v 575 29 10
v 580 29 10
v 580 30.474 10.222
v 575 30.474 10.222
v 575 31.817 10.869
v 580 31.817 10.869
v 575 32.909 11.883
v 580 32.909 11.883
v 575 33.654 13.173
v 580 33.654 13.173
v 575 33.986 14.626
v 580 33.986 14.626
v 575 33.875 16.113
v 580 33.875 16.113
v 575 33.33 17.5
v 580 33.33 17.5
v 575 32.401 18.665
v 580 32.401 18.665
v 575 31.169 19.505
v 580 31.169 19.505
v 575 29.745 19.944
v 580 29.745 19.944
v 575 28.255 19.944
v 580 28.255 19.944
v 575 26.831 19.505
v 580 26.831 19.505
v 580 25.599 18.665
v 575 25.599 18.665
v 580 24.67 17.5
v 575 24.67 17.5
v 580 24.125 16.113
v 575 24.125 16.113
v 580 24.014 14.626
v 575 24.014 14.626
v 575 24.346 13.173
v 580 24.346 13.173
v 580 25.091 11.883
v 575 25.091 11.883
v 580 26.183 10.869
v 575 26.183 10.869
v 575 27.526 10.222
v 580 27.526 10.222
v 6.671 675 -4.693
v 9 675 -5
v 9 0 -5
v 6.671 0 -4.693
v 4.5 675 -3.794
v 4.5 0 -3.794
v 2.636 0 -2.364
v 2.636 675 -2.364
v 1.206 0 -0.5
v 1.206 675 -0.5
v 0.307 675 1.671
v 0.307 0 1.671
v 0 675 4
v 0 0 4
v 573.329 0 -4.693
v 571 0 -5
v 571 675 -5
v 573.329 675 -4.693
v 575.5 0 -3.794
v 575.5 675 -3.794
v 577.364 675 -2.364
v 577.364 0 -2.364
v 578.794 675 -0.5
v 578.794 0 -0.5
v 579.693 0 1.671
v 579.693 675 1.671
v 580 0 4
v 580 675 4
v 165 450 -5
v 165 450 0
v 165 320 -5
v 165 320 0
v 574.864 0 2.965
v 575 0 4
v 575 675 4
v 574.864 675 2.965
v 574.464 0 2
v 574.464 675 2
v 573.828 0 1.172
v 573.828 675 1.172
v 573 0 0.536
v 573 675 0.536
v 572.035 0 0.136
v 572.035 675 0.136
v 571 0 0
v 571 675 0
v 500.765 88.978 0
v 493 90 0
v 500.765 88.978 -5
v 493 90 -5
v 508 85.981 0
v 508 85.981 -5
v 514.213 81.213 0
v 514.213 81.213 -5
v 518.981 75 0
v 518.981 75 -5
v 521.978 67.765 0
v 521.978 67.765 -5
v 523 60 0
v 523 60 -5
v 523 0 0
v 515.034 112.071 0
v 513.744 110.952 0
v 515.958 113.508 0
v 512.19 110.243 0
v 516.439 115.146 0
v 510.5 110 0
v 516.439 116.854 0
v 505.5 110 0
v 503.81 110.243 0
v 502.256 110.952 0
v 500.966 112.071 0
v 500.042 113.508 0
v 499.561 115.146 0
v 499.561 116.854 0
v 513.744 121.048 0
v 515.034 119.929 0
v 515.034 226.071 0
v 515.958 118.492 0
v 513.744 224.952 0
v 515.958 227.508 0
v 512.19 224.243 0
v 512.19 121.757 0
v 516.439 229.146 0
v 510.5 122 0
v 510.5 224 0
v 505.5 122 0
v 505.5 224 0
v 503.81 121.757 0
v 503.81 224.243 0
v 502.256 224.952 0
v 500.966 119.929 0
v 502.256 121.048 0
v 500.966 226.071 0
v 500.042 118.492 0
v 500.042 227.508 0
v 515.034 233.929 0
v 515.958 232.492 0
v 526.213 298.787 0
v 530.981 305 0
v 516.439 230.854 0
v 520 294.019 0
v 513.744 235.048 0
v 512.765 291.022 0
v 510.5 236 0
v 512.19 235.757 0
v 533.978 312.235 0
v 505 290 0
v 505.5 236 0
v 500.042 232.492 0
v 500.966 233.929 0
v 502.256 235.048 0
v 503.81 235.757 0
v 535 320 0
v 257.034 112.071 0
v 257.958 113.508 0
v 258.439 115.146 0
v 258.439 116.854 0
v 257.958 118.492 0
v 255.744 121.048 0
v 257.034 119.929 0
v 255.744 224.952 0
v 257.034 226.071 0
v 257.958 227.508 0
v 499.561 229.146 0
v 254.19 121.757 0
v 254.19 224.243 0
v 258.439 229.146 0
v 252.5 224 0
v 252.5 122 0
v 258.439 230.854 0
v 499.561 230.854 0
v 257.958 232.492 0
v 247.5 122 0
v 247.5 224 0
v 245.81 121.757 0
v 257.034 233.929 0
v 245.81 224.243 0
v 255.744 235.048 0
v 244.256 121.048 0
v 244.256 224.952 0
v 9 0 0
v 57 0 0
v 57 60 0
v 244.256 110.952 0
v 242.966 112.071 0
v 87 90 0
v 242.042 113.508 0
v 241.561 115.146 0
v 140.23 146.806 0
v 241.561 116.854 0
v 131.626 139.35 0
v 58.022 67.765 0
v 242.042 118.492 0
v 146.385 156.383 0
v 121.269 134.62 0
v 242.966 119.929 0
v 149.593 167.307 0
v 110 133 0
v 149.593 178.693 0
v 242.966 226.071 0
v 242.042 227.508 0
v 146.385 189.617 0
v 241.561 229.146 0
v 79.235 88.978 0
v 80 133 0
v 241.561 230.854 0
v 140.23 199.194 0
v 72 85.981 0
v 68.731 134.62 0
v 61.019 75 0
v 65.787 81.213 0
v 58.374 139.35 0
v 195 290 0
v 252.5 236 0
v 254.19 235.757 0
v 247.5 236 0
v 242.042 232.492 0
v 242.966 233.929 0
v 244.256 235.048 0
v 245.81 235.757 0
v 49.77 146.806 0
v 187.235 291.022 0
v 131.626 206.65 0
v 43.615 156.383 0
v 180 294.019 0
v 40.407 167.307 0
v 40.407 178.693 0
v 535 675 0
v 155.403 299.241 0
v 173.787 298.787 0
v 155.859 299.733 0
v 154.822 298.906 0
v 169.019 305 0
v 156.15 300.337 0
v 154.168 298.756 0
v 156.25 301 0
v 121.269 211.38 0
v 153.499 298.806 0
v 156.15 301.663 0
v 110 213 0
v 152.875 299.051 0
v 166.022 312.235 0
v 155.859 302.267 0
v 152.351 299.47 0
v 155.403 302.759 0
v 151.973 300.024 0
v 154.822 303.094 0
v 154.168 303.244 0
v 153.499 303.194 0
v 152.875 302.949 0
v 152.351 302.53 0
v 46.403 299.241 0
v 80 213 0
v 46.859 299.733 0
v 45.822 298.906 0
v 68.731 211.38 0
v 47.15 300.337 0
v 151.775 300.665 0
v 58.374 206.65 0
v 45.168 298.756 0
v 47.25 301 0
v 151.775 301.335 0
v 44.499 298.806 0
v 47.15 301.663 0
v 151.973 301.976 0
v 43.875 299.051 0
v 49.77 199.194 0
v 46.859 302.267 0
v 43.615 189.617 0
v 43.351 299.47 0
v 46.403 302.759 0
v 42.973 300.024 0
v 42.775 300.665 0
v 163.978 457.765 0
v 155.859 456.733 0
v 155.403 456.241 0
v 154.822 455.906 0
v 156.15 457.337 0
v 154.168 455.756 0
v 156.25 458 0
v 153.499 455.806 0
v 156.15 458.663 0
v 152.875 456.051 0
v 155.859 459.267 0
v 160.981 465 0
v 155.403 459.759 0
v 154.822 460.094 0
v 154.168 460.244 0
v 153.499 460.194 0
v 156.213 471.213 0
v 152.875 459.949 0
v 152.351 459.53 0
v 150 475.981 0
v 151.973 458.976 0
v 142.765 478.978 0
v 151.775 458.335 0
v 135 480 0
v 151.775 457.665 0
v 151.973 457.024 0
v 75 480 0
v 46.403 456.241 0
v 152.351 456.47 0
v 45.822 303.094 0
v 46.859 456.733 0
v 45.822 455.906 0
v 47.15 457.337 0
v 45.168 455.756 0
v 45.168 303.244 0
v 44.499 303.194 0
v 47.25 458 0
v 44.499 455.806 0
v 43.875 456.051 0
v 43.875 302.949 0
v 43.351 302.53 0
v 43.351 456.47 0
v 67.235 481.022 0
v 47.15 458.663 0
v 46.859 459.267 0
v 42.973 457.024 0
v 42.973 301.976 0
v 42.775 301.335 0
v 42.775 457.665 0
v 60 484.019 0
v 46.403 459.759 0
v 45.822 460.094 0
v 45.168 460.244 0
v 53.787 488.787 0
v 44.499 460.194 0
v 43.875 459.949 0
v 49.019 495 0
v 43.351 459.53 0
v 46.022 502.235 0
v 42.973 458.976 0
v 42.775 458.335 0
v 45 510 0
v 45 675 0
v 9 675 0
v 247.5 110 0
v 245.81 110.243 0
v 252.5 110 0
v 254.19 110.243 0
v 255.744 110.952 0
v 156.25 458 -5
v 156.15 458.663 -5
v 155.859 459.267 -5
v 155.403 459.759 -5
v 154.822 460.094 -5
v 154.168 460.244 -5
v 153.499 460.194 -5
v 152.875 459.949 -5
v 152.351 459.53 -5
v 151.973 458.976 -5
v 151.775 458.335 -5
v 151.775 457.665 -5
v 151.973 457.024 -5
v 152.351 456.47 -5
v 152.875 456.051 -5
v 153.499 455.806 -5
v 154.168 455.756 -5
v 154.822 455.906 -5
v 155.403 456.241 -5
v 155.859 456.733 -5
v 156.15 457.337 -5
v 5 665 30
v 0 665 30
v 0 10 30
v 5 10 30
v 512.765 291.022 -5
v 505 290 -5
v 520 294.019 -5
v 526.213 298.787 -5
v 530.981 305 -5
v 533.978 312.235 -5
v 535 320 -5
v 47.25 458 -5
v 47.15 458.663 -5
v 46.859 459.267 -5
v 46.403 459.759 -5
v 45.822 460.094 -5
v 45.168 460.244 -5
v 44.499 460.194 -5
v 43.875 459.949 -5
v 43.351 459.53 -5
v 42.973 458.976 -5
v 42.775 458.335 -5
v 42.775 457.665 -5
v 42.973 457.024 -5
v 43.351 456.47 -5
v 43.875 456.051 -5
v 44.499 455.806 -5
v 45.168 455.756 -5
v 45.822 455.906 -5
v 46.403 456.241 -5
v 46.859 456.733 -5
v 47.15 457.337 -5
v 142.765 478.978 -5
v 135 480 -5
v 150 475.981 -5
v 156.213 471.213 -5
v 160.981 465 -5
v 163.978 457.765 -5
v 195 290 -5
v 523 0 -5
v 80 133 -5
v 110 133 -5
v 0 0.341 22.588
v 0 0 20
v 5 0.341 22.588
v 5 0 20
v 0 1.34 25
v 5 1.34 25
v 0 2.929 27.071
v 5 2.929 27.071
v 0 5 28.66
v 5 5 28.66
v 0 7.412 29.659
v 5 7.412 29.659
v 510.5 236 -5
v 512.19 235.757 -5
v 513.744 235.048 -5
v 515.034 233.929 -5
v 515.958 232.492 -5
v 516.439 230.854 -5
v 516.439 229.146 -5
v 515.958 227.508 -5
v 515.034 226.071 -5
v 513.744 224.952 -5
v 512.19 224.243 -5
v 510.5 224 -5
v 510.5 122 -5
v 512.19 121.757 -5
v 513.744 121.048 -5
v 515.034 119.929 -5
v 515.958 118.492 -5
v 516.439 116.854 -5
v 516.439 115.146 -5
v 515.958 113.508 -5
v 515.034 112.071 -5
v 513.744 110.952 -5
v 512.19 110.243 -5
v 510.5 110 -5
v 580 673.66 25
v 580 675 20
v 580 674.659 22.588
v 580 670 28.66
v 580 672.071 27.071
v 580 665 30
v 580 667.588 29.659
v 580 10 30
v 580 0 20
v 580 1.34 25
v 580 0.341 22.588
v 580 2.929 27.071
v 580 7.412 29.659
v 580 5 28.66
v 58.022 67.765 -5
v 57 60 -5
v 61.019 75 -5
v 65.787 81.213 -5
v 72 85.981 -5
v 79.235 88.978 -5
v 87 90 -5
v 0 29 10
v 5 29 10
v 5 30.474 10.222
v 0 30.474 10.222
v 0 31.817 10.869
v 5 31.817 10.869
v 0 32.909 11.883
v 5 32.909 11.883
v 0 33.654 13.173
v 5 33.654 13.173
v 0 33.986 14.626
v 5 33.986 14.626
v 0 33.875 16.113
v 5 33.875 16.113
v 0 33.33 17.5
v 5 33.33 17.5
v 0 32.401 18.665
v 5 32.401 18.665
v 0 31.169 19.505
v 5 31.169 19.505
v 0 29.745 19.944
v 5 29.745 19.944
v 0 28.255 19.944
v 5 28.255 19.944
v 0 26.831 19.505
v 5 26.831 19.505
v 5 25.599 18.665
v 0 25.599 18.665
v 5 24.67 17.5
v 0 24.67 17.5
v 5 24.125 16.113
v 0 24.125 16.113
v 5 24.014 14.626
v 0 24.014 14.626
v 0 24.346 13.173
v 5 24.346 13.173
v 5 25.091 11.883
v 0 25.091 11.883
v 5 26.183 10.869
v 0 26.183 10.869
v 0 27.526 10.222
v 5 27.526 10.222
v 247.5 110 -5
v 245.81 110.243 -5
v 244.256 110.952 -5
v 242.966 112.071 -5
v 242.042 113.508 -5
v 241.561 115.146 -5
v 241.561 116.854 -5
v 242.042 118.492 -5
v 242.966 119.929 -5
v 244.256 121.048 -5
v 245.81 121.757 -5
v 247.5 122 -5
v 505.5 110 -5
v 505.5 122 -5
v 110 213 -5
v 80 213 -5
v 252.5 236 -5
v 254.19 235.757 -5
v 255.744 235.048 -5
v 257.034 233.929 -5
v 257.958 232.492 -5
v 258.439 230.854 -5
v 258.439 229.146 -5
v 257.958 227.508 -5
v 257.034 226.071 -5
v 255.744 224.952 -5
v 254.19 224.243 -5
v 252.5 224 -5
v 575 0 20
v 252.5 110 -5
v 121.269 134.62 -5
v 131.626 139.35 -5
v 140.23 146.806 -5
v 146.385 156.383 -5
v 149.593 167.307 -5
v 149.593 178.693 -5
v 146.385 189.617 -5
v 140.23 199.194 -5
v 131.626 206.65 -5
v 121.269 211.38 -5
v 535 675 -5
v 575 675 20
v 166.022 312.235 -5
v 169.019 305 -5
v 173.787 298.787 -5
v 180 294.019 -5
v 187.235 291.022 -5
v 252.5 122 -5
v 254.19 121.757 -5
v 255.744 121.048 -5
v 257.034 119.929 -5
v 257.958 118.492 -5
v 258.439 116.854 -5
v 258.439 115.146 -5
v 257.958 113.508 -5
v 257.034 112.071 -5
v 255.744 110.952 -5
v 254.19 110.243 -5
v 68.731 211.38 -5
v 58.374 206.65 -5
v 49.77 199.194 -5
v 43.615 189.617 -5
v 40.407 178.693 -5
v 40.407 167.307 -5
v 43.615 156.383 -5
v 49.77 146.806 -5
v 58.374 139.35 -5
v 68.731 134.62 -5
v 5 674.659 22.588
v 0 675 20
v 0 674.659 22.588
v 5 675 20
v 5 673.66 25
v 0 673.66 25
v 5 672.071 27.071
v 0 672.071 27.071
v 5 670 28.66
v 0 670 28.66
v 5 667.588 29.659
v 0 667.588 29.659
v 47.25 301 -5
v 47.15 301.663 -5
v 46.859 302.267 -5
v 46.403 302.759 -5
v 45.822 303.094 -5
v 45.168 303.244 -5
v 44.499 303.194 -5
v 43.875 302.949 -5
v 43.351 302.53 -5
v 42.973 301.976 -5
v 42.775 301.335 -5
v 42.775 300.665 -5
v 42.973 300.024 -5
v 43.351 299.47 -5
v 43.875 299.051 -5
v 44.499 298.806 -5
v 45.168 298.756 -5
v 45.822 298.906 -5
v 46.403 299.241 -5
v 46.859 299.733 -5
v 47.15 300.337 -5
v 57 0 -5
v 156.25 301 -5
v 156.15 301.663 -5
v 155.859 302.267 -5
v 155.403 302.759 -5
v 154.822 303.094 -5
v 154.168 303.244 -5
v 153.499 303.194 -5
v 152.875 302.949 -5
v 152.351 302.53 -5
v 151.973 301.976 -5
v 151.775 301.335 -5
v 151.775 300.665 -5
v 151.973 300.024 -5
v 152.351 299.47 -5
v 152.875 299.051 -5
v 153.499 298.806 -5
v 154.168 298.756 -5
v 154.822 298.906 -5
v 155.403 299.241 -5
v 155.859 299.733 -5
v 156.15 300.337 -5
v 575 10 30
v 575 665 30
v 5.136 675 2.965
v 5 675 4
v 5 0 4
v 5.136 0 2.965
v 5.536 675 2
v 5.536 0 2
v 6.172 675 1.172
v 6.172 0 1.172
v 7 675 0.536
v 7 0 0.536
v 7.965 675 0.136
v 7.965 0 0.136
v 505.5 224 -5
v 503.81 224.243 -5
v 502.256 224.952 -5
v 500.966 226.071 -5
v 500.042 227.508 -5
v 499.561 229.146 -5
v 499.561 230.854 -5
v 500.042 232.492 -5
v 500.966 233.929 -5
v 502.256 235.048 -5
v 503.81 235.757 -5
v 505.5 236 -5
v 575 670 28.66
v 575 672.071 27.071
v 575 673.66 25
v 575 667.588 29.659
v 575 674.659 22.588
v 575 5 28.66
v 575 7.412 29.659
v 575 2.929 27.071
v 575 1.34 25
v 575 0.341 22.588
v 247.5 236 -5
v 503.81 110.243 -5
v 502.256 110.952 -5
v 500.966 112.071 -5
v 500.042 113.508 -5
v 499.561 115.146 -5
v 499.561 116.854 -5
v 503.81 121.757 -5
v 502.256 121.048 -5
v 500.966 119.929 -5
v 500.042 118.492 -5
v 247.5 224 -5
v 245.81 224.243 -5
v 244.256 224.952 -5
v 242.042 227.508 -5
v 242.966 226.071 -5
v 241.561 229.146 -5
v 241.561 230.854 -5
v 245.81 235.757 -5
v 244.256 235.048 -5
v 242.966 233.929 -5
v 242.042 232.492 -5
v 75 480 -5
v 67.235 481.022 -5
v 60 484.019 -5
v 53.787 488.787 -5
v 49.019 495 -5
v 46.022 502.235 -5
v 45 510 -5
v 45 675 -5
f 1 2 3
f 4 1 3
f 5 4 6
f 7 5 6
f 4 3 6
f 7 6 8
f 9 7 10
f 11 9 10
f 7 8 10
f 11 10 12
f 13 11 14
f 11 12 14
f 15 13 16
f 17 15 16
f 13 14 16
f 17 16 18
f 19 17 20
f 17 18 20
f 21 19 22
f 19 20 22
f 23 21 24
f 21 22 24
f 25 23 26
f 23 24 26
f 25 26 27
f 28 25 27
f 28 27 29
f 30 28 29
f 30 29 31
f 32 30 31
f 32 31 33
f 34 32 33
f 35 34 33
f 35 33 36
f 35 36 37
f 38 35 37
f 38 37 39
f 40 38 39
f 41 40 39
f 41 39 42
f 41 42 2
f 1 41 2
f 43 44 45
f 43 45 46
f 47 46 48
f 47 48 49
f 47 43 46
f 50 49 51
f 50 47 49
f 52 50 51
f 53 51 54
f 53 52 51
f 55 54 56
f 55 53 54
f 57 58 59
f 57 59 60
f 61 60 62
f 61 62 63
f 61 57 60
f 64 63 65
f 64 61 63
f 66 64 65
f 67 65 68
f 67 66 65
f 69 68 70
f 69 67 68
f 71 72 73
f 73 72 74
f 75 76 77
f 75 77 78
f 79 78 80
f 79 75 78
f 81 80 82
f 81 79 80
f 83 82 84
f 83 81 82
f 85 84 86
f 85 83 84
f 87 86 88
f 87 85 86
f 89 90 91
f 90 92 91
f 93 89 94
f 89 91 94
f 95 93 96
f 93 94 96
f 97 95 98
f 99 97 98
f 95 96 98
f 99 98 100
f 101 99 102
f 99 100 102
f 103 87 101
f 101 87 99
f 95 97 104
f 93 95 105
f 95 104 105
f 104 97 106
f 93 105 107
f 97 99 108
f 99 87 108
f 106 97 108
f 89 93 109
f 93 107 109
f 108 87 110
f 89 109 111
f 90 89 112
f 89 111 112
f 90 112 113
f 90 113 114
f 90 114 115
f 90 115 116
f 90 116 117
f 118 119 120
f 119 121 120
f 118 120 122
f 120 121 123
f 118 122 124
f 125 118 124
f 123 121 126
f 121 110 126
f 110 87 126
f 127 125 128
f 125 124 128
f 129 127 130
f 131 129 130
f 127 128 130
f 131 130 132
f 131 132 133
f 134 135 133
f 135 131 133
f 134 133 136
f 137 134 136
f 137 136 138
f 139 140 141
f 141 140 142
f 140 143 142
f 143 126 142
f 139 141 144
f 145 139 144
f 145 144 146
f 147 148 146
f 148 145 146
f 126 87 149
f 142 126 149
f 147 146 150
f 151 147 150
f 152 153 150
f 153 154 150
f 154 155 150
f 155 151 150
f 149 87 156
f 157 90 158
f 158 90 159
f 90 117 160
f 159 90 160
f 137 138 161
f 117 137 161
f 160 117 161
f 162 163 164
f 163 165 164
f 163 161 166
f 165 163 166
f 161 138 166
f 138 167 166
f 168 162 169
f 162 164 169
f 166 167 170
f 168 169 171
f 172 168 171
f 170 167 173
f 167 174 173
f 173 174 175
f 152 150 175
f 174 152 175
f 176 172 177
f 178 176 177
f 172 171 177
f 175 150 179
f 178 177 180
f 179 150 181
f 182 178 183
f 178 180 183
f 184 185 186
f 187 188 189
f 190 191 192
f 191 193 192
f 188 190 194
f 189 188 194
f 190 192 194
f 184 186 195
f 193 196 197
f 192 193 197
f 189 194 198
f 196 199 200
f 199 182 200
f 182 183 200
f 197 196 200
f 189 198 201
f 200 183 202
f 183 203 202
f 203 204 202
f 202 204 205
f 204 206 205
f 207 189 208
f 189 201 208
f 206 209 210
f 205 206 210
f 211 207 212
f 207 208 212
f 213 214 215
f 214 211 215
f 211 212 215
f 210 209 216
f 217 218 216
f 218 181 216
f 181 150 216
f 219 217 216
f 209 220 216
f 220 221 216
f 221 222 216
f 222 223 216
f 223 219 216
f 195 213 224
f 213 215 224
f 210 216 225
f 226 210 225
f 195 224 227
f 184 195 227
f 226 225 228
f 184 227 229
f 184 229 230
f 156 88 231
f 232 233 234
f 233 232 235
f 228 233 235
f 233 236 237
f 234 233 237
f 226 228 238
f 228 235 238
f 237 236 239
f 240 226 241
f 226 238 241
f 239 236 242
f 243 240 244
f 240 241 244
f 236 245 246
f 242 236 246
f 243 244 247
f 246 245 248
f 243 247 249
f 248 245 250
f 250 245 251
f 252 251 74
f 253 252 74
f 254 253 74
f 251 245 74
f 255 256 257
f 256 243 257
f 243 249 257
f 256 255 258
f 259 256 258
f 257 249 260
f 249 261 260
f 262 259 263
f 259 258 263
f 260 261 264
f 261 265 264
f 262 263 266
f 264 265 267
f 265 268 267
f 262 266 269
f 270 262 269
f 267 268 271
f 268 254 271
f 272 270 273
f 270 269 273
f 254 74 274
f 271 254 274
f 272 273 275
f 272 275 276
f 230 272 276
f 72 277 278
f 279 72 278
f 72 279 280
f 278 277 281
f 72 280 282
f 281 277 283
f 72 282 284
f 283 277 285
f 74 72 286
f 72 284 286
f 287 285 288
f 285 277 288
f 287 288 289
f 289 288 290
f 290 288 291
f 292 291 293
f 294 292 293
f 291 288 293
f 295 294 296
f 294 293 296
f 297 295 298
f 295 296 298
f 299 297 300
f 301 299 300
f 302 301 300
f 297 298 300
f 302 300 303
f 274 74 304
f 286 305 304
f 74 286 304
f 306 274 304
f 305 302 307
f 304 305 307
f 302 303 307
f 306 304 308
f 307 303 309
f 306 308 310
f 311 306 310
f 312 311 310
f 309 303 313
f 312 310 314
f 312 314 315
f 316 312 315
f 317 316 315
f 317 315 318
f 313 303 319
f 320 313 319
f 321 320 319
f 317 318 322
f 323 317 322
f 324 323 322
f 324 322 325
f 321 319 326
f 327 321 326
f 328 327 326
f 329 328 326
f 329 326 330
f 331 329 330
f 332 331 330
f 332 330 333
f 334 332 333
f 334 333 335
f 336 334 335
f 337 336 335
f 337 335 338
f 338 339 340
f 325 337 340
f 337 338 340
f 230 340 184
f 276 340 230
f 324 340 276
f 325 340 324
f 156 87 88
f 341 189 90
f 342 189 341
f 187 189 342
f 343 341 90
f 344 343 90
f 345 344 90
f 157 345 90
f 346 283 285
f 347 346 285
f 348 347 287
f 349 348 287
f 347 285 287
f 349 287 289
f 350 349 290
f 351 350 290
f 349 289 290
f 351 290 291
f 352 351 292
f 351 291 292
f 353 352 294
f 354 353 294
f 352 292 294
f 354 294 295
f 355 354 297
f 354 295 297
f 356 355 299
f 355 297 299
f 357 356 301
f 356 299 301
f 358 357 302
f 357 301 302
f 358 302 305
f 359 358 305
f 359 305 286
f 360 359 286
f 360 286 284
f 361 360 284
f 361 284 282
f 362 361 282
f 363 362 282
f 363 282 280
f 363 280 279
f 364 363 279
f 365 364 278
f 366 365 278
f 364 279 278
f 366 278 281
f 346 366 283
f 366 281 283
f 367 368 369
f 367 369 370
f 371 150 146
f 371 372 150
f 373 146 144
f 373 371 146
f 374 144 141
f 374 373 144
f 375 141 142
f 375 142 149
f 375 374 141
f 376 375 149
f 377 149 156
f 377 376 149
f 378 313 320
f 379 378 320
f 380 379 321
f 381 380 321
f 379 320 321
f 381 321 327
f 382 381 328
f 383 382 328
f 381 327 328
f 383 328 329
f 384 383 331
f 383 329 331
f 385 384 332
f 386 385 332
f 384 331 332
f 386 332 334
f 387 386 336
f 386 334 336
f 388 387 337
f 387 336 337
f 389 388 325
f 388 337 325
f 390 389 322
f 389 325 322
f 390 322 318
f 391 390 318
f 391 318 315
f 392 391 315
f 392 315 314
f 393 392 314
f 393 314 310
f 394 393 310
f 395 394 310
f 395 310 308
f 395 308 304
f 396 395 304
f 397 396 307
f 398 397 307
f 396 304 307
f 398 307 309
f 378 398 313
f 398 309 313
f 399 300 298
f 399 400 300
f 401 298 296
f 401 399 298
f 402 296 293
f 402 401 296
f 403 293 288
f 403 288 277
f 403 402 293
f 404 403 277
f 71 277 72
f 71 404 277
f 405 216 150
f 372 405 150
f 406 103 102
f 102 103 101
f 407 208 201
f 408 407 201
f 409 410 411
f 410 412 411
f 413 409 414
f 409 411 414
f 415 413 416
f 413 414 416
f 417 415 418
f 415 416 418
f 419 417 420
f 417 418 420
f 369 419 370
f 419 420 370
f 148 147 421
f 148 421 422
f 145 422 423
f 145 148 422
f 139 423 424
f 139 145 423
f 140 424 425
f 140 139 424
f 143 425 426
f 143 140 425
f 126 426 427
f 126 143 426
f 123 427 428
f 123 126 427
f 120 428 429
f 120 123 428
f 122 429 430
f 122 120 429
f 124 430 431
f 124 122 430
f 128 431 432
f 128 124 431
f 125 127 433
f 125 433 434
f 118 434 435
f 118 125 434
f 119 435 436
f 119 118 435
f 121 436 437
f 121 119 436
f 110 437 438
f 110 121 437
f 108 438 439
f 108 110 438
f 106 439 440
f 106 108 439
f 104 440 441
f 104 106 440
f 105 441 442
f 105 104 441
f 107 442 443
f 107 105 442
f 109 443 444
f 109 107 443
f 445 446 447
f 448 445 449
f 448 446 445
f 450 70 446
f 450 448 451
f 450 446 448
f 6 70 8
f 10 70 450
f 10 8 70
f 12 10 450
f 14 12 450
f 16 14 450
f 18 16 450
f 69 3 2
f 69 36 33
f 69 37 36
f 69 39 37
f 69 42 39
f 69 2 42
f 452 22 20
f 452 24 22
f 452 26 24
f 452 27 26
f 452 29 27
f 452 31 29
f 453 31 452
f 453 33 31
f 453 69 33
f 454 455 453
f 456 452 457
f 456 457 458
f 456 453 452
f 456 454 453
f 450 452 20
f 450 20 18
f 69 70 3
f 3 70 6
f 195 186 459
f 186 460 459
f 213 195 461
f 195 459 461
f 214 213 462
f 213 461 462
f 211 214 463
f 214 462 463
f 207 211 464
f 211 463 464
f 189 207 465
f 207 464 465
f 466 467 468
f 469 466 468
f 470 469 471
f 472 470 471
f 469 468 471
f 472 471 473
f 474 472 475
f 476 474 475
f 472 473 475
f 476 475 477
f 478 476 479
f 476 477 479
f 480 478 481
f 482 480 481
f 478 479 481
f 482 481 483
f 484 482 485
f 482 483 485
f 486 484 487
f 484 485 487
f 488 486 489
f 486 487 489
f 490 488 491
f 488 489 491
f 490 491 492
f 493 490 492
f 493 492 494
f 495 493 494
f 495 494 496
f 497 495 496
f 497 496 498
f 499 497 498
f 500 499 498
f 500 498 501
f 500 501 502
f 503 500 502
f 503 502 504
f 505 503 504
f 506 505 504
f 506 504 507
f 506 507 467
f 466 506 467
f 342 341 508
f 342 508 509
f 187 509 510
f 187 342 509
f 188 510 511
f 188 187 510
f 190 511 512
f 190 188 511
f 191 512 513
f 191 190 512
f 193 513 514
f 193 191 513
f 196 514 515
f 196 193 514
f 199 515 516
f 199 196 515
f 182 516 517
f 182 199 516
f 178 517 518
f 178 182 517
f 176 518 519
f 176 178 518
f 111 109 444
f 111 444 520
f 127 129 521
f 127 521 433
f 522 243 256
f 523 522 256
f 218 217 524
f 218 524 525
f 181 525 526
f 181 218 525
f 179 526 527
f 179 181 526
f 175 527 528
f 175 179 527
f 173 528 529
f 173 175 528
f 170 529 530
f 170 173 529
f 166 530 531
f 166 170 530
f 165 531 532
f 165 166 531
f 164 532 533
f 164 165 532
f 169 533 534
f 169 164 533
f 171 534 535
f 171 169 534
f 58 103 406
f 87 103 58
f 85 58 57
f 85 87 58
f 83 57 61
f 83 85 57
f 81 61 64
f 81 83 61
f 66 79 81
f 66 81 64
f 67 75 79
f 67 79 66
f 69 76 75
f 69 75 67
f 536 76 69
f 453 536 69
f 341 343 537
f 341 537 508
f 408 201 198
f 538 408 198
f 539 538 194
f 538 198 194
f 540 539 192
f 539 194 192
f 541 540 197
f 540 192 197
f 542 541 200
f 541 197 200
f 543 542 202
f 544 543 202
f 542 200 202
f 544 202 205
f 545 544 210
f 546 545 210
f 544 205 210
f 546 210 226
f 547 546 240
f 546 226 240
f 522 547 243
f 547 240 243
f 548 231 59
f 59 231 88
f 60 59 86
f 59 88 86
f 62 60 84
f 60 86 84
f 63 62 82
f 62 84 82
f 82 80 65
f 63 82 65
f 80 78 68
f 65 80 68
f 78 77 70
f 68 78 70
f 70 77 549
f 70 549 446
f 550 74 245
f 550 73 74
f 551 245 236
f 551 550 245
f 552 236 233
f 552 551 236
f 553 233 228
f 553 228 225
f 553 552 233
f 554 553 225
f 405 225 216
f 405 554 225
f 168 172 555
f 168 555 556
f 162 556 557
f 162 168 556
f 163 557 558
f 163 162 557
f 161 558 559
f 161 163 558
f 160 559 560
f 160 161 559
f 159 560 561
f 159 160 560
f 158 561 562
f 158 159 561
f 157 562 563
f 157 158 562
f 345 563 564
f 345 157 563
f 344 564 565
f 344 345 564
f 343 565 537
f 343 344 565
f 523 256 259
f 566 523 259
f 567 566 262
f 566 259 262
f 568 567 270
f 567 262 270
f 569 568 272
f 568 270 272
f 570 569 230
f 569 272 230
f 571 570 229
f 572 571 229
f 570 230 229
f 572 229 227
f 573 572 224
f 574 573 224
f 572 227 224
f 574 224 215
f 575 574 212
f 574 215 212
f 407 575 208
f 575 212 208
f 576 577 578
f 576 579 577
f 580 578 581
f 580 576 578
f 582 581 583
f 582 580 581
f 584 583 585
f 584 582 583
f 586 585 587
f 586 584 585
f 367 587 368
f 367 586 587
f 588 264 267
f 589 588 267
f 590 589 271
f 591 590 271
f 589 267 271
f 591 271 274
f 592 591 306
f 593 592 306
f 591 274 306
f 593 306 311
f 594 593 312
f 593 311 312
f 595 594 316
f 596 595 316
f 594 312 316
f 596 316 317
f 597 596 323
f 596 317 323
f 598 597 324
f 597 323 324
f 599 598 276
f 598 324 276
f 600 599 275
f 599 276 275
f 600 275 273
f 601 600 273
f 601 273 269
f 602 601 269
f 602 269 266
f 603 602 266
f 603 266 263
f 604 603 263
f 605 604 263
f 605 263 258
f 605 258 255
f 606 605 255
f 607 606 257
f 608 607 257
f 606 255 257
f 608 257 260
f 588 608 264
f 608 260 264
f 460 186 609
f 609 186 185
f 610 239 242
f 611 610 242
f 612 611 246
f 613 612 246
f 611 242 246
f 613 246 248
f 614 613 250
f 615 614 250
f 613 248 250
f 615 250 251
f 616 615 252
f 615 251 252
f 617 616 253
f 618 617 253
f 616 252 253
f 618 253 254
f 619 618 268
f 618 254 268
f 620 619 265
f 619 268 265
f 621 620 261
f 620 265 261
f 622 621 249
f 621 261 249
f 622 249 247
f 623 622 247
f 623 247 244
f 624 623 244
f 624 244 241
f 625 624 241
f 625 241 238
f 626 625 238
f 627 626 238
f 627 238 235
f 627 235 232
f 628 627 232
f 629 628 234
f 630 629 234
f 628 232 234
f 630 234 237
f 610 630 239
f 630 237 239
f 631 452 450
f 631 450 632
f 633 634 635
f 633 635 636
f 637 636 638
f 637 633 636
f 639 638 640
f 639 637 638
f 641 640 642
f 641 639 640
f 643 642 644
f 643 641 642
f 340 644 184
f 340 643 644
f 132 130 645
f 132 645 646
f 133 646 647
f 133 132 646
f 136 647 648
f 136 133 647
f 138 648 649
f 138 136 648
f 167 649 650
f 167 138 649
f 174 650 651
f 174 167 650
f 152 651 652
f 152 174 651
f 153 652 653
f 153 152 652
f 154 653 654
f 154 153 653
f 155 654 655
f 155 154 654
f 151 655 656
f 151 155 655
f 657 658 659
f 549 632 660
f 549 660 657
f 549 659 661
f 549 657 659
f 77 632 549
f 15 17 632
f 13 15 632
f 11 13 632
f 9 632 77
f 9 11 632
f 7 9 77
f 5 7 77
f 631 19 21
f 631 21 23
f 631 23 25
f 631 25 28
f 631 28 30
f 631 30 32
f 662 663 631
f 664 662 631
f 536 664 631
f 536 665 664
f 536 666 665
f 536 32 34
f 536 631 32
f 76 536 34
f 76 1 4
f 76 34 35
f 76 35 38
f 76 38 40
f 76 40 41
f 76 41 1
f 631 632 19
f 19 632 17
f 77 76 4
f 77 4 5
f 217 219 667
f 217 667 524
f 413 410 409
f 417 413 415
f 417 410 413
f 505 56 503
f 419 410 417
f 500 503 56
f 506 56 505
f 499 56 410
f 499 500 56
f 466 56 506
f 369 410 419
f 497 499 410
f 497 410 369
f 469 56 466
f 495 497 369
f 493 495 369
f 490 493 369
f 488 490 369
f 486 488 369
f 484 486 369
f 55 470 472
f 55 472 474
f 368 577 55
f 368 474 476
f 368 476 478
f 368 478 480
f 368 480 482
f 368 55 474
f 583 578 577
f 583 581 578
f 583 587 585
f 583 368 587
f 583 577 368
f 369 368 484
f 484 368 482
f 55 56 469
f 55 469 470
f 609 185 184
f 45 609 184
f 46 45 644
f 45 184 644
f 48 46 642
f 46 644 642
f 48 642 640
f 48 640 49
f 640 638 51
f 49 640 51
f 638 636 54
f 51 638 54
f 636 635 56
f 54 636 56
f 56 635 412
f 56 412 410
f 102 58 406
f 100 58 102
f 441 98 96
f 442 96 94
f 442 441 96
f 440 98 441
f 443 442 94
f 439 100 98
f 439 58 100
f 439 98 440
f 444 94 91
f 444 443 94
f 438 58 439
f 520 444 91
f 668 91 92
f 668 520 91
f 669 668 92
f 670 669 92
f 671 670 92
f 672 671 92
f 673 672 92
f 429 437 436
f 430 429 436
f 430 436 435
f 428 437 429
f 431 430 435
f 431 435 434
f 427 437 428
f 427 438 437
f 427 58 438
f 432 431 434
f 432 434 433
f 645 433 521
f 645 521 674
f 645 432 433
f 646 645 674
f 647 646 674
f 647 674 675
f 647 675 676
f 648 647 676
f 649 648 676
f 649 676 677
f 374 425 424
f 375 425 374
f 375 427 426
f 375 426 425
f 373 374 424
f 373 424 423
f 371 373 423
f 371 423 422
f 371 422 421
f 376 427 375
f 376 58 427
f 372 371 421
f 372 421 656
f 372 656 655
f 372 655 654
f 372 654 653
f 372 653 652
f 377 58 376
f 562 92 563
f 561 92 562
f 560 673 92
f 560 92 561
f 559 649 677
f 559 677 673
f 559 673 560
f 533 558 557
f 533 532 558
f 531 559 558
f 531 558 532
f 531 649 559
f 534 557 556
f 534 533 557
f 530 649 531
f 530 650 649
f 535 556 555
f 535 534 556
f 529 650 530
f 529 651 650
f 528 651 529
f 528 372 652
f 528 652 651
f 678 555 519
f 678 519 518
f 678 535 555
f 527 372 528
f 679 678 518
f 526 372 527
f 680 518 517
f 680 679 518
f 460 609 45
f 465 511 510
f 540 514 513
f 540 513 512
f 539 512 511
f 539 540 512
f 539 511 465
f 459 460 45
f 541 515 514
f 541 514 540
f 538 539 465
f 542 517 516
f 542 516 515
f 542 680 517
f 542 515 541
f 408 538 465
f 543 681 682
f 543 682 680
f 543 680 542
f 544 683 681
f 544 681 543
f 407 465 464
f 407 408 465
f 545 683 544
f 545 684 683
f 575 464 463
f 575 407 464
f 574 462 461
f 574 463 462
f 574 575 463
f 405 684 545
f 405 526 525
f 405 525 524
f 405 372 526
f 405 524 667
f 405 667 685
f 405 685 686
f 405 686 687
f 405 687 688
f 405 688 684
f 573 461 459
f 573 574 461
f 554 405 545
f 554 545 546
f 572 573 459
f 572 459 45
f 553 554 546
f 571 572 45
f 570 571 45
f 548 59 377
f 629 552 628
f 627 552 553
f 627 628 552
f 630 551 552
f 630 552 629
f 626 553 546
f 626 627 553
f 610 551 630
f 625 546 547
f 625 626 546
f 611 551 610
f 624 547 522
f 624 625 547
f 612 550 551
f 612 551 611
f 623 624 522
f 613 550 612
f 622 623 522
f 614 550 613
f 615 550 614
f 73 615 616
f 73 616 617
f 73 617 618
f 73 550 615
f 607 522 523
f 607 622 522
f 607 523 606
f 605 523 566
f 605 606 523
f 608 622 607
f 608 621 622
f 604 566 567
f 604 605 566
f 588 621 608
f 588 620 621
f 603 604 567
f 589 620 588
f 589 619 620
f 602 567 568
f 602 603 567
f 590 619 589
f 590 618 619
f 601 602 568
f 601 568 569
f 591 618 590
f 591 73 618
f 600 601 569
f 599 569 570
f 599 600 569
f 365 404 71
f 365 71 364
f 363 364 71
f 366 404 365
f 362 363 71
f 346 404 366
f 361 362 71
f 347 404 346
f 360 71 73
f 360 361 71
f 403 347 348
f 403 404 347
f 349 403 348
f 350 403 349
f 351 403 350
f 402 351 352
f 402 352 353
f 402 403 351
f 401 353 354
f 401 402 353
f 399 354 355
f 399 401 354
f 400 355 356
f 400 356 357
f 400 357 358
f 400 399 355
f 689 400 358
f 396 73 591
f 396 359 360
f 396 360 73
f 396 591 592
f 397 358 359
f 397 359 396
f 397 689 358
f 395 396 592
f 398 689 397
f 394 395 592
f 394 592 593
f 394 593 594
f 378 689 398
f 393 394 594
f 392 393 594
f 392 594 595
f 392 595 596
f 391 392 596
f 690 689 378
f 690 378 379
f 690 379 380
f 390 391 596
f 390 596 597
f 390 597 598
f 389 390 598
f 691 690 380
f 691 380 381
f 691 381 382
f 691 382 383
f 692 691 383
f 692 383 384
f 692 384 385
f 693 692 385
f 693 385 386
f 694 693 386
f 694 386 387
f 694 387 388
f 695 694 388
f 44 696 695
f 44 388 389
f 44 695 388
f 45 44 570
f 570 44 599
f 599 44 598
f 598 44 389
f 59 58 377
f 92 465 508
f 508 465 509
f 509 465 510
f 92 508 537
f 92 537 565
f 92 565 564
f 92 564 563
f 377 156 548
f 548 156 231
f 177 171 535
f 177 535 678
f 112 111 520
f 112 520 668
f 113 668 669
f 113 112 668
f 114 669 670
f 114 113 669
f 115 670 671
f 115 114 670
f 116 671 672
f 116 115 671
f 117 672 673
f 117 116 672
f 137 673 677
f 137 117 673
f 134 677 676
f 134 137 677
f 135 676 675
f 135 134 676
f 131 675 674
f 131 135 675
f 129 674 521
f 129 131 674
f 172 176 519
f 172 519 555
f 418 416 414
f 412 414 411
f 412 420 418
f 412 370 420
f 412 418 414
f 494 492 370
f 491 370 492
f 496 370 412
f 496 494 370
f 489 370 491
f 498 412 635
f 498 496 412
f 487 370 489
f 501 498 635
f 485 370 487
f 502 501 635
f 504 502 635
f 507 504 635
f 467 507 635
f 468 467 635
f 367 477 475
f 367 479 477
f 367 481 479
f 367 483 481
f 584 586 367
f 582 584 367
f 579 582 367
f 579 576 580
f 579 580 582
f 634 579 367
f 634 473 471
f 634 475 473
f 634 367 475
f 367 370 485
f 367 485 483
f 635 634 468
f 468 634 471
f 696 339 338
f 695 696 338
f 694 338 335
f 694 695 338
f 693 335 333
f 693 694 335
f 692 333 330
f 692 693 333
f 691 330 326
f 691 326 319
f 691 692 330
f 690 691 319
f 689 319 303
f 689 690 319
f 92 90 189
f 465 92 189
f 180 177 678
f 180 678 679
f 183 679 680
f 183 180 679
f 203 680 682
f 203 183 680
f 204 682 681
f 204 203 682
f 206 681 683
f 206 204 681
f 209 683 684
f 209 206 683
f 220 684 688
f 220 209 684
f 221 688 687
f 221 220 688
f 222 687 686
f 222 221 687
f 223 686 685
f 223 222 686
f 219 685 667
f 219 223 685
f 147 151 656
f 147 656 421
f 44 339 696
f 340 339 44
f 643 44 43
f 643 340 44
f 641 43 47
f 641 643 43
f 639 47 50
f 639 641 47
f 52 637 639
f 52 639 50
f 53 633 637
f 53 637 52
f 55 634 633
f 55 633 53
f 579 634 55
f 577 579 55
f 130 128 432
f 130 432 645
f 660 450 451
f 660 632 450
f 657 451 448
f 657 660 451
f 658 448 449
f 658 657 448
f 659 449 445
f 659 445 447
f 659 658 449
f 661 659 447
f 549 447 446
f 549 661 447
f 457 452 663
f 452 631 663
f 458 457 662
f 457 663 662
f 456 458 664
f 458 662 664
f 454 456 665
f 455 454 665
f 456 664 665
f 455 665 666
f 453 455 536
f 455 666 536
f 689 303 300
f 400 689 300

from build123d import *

# Parameters (mm, degrees)
SKETCH_1_R                         = 2.25
SM_BASE_FLANGE_1_DEPTH             = 5
FILLET_1_R                         = 30
SM_EDGE_FLANGE_1_STRIP_W           = 28
SM_EDGE_FLANGE_1_STRIP_H           = 5
SM_EDGE_FLANGE_1_STRIP_CUT_DEPTH   = 675
SM_EDGE_FLANGE_1_STRIP_2_W         = 28
SM_EDGE_FLANGE_1_STRIP_2_H         = 5
SM_EDGE_FLANGE_1_STRIP_CUT_2_DEPTH = 675
SM_EDGE_FLANGE_1_DEPTH             = 675
SM_EDGE_FLANGE_1_BEND_DEPTH        = 675
CUT_EXTRUDE_3_REACH                = 892.463
FILLET_2_R                         = 10
SKETCH_12_R                        = 5
CUT_EXTRUDE_4_DEPTH                = 891.463362525


# Sheet-metal steps are written as plain solids
with BuildPart() as part:
    # Sketch 1 → 基体-法兰1 (new body)
    with BuildSketch(Plane.XY):
        Polygon((0, 0), (0, 675), (45, 675), (45, 480), (165, 480), (165, 290), (535, 290), (535, 675), (580, 675), (580, 0), (523, 0), (523, 90), (57, 90), (57, 0), align=None)
        with Locations((154, 458)):
            Circle(SKETCH_1_R, mode=Mode.SUBTRACT)
        with Locations((45, 458)):
            Circle(SKETCH_1_R, mode=Mode.SUBTRACT)
        with Locations((154, 301)):
            Circle(SKETCH_1_R, mode=Mode.SUBTRACT)
        with Locations((45, 301)):
            Circle(SKETCH_1_R, mode=Mode.SUBTRACT)
        with BuildLine():
            Line((80, 133), (110, 133))
            ThreePointArc((110, 133), (150, 173), (110, 213))
            Line((110, 213), (80, 213))
            ThreePointArc((80, 213), (40, 173), (80, 133))
        make_face(mode=Mode.SUBTRACT)
    extrude(amount=-SM_BASE_FLANGE_1_DEPTH)

    # 圆角1
    fillet_1_edges = [part.edges().sort_by_distance(p)[0] for p in [
        (45, 480, -2.5),
        (165, 480, -2.5),
        (165, 290, -2.5),
        (535, 290, -2.5),
        (523, 90, -2.5),
        (57, 90, -2.5),
    ]]
    fillet(fillet_1_edges, radius=FILLET_1_R)

    # 边线-法兰1 strip (across the edge) → 边线-法兰1 strip cut (cut)
    with BuildSketch(Plane.XZ.offset(-675)):
        with Locations((-5, -2.5)):
            Rectangle(SM_EDGE_FLANGE_1_STRIP_W, SM_EDGE_FLANGE_1_STRIP_H)
    extrude(amount=SM_EDGE_FLANGE_1_STRIP_CUT_DEPTH, mode=Mode.SUBTRACT)

    # 边线-法兰1 strip 2 (across the edge) → 边线-法兰1 strip cut 2 (cut)
    with BuildSketch(Plane(origin=(580, 0, 0), x_dir=(-1, 0, 0), z_dir=(0, 1, 0))):
        with Locations((-5, -2.5)):
            Rectangle(SM_EDGE_FLANGE_1_STRIP_2_W, SM_EDGE_FLANGE_1_STRIP_2_H)
    extrude(amount=SM_EDGE_FLANGE_1_STRIP_CUT_2_DEPTH, mode=Mode.SUBTRACT)

    # 边线-法兰1 section (across the edge) → 边线-法兰1 (add)
    with BuildSketch(Plane.XZ.offset(-675)):
        with BuildLine():
            Line((0, 4), (0, 30))
            Line((0, 30), (5, 30))
            Line((5, 30), (5, 4))
            ThreePointArc((5, 4), (6.171572875, 1.171572875), (9, 0))
            Line((9, 0), (9, -5))
            ThreePointArc((9, -5), (2.636038969, -2.363961031), (0, 4))
        make_face()
    extrude(amount=SM_EDGE_FLANGE_1_DEPTH)

    # 边线-法兰1 section 2 (across the edge) → 边线-法兰1 bend (add)
    with BuildSketch(Plane(origin=(580, 0, 0), x_dir=(-1, 0, 0), z_dir=(0, 1, 0))):
        with BuildLine():
            Line((0, 4), (0, 30))
            Line((0, 30), (5, 30))
            Line((5, 30), (5, 4))
            ThreePointArc((5, 4), (6.171572875, 1.171572875), (9, 0))
            Line((9, 0), (9, -5))
            ThreePointArc((9, -5), (2.636038969, -2.363961031), (0, 4))
        make_face()
    extrude(amount=SM_EDGE_FLANGE_1_BEND_DEPTH)

    # 草图11 → 切除-拉伸3 (cut, up to next)
    with BuildSketch(Plane.XY, mode=Mode.PRIVATE) as cut_extrude_3_sk1:
        with BuildLine():
            Line((252.5, 110), (247.5, 110))
            ThreePointArc((247.5, 110), (241.5, 116), (247.5, 122))
            Line((247.5, 122), (252.5, 122))
            ThreePointArc((252.5, 122), (258.5, 116), (252.5, 110))
        make_face()
    cut_extrude_3_tool1 = extrude(cut_extrude_3_sk1.sketch, amount=-CUT_EXTRUDE_3_REACH, mode=Mode.PRIVATE) & part.part
    # 草图11 → 切除-拉伸3 (cut, up to next)
    with BuildSketch(Plane.XY, mode=Mode.PRIVATE) as cut_extrude_3_sk2:
        with BuildLine():
            Line((510.5, 110), (505.5, 110))
            ThreePointArc((505.5, 110), (499.5, 116), (505.5, 122))
            Line((505.5, 122), (510.5, 122))
            ThreePointArc((510.5, 122), (516.5, 116), (510.5, 110))
        make_face()
    cut_extrude_3_tool2 = extrude(cut_extrude_3_sk2.sketch, amount=-CUT_EXTRUDE_3_REACH, mode=Mode.PRIVATE) & part.part
    # 草图11 → 切除-拉伸3 (cut, up to next)
    with BuildSketch(Plane.XY, mode=Mode.PRIVATE) as cut_extrude_3_sk3:
        with BuildLine():
            Line((510.5, 224), (505.5, 224))
            ThreePointArc((505.5, 224), (499.5, 230), (505.5, 236))
            Line((505.5, 236), (510.5, 236))
            ThreePointArc((510.5, 236), (516.5, 230), (510.5, 224))
        make_face()
    cut_extrude_3_tool3 = extrude(cut_extrude_3_sk3.sketch, amount=-CUT_EXTRUDE_3_REACH, mode=Mode.PRIVATE) & part.part
    # 草图11 → 切除-拉伸3 (cut, up to next)
    with BuildSketch(Plane.XY, mode=Mode.PRIVATE) as cut_extrude_3_sk4:
        with BuildLine():
            Line((252.5, 224), (247.5, 224))
            ThreePointArc((247.5, 224), (241.5, 230), (247.5, 236))
            Line((247.5, 236), (252.5, 236))
            ThreePointArc((252.5, 236), (258.5, 230), (252.5, 224))
        make_face()
    cut_extrude_3_tool4 = extrude(cut_extrude_3_sk4.sketch, amount=-CUT_EXTRUDE_3_REACH, mode=Mode.PRIVATE) & part.part
    add(cut_extrude_3_tool1.solids().sort_by_distance((250, 116, 0))[0], mode=Mode.SUBTRACT)
    add(cut_extrude_3_tool2.solids().sort_by_distance((508, 116, 0))[0], mode=Mode.SUBTRACT)
    add(cut_extrude_3_tool3.solids().sort_by_distance((508, 230, 0))[0], mode=Mode.SUBTRACT)
    add(cut_extrude_3_tool4.solids().sort_by_distance((250, 230, 0))[0], mode=Mode.SUBTRACT)

    # 圆角2
    fillet_2_edges = [part.edges().sort_by_distance(p)[0] for p in [
        (2.5, 675, 30),
        (2.5, 0, 30),
        (577.5, 0, 30),
        (577.5, 675, 30),
    ]]
    fillet(fillet_2_edges, radius=FILLET_2_R)

    # 草图12 → 切除-拉伸4 (cut, through all)
    with BuildSketch(Plane(origin=(580, 0, 0), x_dir=(0, 0, -1), z_dir=(1, 0, 0))):
        with Locations((-15, 29)):
            Circle(SKETCH_12_R)
    extrude(amount=-CUT_EXTRUDE_4_DEPTH, mode=Mode.SUBTRACT)


solid = part.part
